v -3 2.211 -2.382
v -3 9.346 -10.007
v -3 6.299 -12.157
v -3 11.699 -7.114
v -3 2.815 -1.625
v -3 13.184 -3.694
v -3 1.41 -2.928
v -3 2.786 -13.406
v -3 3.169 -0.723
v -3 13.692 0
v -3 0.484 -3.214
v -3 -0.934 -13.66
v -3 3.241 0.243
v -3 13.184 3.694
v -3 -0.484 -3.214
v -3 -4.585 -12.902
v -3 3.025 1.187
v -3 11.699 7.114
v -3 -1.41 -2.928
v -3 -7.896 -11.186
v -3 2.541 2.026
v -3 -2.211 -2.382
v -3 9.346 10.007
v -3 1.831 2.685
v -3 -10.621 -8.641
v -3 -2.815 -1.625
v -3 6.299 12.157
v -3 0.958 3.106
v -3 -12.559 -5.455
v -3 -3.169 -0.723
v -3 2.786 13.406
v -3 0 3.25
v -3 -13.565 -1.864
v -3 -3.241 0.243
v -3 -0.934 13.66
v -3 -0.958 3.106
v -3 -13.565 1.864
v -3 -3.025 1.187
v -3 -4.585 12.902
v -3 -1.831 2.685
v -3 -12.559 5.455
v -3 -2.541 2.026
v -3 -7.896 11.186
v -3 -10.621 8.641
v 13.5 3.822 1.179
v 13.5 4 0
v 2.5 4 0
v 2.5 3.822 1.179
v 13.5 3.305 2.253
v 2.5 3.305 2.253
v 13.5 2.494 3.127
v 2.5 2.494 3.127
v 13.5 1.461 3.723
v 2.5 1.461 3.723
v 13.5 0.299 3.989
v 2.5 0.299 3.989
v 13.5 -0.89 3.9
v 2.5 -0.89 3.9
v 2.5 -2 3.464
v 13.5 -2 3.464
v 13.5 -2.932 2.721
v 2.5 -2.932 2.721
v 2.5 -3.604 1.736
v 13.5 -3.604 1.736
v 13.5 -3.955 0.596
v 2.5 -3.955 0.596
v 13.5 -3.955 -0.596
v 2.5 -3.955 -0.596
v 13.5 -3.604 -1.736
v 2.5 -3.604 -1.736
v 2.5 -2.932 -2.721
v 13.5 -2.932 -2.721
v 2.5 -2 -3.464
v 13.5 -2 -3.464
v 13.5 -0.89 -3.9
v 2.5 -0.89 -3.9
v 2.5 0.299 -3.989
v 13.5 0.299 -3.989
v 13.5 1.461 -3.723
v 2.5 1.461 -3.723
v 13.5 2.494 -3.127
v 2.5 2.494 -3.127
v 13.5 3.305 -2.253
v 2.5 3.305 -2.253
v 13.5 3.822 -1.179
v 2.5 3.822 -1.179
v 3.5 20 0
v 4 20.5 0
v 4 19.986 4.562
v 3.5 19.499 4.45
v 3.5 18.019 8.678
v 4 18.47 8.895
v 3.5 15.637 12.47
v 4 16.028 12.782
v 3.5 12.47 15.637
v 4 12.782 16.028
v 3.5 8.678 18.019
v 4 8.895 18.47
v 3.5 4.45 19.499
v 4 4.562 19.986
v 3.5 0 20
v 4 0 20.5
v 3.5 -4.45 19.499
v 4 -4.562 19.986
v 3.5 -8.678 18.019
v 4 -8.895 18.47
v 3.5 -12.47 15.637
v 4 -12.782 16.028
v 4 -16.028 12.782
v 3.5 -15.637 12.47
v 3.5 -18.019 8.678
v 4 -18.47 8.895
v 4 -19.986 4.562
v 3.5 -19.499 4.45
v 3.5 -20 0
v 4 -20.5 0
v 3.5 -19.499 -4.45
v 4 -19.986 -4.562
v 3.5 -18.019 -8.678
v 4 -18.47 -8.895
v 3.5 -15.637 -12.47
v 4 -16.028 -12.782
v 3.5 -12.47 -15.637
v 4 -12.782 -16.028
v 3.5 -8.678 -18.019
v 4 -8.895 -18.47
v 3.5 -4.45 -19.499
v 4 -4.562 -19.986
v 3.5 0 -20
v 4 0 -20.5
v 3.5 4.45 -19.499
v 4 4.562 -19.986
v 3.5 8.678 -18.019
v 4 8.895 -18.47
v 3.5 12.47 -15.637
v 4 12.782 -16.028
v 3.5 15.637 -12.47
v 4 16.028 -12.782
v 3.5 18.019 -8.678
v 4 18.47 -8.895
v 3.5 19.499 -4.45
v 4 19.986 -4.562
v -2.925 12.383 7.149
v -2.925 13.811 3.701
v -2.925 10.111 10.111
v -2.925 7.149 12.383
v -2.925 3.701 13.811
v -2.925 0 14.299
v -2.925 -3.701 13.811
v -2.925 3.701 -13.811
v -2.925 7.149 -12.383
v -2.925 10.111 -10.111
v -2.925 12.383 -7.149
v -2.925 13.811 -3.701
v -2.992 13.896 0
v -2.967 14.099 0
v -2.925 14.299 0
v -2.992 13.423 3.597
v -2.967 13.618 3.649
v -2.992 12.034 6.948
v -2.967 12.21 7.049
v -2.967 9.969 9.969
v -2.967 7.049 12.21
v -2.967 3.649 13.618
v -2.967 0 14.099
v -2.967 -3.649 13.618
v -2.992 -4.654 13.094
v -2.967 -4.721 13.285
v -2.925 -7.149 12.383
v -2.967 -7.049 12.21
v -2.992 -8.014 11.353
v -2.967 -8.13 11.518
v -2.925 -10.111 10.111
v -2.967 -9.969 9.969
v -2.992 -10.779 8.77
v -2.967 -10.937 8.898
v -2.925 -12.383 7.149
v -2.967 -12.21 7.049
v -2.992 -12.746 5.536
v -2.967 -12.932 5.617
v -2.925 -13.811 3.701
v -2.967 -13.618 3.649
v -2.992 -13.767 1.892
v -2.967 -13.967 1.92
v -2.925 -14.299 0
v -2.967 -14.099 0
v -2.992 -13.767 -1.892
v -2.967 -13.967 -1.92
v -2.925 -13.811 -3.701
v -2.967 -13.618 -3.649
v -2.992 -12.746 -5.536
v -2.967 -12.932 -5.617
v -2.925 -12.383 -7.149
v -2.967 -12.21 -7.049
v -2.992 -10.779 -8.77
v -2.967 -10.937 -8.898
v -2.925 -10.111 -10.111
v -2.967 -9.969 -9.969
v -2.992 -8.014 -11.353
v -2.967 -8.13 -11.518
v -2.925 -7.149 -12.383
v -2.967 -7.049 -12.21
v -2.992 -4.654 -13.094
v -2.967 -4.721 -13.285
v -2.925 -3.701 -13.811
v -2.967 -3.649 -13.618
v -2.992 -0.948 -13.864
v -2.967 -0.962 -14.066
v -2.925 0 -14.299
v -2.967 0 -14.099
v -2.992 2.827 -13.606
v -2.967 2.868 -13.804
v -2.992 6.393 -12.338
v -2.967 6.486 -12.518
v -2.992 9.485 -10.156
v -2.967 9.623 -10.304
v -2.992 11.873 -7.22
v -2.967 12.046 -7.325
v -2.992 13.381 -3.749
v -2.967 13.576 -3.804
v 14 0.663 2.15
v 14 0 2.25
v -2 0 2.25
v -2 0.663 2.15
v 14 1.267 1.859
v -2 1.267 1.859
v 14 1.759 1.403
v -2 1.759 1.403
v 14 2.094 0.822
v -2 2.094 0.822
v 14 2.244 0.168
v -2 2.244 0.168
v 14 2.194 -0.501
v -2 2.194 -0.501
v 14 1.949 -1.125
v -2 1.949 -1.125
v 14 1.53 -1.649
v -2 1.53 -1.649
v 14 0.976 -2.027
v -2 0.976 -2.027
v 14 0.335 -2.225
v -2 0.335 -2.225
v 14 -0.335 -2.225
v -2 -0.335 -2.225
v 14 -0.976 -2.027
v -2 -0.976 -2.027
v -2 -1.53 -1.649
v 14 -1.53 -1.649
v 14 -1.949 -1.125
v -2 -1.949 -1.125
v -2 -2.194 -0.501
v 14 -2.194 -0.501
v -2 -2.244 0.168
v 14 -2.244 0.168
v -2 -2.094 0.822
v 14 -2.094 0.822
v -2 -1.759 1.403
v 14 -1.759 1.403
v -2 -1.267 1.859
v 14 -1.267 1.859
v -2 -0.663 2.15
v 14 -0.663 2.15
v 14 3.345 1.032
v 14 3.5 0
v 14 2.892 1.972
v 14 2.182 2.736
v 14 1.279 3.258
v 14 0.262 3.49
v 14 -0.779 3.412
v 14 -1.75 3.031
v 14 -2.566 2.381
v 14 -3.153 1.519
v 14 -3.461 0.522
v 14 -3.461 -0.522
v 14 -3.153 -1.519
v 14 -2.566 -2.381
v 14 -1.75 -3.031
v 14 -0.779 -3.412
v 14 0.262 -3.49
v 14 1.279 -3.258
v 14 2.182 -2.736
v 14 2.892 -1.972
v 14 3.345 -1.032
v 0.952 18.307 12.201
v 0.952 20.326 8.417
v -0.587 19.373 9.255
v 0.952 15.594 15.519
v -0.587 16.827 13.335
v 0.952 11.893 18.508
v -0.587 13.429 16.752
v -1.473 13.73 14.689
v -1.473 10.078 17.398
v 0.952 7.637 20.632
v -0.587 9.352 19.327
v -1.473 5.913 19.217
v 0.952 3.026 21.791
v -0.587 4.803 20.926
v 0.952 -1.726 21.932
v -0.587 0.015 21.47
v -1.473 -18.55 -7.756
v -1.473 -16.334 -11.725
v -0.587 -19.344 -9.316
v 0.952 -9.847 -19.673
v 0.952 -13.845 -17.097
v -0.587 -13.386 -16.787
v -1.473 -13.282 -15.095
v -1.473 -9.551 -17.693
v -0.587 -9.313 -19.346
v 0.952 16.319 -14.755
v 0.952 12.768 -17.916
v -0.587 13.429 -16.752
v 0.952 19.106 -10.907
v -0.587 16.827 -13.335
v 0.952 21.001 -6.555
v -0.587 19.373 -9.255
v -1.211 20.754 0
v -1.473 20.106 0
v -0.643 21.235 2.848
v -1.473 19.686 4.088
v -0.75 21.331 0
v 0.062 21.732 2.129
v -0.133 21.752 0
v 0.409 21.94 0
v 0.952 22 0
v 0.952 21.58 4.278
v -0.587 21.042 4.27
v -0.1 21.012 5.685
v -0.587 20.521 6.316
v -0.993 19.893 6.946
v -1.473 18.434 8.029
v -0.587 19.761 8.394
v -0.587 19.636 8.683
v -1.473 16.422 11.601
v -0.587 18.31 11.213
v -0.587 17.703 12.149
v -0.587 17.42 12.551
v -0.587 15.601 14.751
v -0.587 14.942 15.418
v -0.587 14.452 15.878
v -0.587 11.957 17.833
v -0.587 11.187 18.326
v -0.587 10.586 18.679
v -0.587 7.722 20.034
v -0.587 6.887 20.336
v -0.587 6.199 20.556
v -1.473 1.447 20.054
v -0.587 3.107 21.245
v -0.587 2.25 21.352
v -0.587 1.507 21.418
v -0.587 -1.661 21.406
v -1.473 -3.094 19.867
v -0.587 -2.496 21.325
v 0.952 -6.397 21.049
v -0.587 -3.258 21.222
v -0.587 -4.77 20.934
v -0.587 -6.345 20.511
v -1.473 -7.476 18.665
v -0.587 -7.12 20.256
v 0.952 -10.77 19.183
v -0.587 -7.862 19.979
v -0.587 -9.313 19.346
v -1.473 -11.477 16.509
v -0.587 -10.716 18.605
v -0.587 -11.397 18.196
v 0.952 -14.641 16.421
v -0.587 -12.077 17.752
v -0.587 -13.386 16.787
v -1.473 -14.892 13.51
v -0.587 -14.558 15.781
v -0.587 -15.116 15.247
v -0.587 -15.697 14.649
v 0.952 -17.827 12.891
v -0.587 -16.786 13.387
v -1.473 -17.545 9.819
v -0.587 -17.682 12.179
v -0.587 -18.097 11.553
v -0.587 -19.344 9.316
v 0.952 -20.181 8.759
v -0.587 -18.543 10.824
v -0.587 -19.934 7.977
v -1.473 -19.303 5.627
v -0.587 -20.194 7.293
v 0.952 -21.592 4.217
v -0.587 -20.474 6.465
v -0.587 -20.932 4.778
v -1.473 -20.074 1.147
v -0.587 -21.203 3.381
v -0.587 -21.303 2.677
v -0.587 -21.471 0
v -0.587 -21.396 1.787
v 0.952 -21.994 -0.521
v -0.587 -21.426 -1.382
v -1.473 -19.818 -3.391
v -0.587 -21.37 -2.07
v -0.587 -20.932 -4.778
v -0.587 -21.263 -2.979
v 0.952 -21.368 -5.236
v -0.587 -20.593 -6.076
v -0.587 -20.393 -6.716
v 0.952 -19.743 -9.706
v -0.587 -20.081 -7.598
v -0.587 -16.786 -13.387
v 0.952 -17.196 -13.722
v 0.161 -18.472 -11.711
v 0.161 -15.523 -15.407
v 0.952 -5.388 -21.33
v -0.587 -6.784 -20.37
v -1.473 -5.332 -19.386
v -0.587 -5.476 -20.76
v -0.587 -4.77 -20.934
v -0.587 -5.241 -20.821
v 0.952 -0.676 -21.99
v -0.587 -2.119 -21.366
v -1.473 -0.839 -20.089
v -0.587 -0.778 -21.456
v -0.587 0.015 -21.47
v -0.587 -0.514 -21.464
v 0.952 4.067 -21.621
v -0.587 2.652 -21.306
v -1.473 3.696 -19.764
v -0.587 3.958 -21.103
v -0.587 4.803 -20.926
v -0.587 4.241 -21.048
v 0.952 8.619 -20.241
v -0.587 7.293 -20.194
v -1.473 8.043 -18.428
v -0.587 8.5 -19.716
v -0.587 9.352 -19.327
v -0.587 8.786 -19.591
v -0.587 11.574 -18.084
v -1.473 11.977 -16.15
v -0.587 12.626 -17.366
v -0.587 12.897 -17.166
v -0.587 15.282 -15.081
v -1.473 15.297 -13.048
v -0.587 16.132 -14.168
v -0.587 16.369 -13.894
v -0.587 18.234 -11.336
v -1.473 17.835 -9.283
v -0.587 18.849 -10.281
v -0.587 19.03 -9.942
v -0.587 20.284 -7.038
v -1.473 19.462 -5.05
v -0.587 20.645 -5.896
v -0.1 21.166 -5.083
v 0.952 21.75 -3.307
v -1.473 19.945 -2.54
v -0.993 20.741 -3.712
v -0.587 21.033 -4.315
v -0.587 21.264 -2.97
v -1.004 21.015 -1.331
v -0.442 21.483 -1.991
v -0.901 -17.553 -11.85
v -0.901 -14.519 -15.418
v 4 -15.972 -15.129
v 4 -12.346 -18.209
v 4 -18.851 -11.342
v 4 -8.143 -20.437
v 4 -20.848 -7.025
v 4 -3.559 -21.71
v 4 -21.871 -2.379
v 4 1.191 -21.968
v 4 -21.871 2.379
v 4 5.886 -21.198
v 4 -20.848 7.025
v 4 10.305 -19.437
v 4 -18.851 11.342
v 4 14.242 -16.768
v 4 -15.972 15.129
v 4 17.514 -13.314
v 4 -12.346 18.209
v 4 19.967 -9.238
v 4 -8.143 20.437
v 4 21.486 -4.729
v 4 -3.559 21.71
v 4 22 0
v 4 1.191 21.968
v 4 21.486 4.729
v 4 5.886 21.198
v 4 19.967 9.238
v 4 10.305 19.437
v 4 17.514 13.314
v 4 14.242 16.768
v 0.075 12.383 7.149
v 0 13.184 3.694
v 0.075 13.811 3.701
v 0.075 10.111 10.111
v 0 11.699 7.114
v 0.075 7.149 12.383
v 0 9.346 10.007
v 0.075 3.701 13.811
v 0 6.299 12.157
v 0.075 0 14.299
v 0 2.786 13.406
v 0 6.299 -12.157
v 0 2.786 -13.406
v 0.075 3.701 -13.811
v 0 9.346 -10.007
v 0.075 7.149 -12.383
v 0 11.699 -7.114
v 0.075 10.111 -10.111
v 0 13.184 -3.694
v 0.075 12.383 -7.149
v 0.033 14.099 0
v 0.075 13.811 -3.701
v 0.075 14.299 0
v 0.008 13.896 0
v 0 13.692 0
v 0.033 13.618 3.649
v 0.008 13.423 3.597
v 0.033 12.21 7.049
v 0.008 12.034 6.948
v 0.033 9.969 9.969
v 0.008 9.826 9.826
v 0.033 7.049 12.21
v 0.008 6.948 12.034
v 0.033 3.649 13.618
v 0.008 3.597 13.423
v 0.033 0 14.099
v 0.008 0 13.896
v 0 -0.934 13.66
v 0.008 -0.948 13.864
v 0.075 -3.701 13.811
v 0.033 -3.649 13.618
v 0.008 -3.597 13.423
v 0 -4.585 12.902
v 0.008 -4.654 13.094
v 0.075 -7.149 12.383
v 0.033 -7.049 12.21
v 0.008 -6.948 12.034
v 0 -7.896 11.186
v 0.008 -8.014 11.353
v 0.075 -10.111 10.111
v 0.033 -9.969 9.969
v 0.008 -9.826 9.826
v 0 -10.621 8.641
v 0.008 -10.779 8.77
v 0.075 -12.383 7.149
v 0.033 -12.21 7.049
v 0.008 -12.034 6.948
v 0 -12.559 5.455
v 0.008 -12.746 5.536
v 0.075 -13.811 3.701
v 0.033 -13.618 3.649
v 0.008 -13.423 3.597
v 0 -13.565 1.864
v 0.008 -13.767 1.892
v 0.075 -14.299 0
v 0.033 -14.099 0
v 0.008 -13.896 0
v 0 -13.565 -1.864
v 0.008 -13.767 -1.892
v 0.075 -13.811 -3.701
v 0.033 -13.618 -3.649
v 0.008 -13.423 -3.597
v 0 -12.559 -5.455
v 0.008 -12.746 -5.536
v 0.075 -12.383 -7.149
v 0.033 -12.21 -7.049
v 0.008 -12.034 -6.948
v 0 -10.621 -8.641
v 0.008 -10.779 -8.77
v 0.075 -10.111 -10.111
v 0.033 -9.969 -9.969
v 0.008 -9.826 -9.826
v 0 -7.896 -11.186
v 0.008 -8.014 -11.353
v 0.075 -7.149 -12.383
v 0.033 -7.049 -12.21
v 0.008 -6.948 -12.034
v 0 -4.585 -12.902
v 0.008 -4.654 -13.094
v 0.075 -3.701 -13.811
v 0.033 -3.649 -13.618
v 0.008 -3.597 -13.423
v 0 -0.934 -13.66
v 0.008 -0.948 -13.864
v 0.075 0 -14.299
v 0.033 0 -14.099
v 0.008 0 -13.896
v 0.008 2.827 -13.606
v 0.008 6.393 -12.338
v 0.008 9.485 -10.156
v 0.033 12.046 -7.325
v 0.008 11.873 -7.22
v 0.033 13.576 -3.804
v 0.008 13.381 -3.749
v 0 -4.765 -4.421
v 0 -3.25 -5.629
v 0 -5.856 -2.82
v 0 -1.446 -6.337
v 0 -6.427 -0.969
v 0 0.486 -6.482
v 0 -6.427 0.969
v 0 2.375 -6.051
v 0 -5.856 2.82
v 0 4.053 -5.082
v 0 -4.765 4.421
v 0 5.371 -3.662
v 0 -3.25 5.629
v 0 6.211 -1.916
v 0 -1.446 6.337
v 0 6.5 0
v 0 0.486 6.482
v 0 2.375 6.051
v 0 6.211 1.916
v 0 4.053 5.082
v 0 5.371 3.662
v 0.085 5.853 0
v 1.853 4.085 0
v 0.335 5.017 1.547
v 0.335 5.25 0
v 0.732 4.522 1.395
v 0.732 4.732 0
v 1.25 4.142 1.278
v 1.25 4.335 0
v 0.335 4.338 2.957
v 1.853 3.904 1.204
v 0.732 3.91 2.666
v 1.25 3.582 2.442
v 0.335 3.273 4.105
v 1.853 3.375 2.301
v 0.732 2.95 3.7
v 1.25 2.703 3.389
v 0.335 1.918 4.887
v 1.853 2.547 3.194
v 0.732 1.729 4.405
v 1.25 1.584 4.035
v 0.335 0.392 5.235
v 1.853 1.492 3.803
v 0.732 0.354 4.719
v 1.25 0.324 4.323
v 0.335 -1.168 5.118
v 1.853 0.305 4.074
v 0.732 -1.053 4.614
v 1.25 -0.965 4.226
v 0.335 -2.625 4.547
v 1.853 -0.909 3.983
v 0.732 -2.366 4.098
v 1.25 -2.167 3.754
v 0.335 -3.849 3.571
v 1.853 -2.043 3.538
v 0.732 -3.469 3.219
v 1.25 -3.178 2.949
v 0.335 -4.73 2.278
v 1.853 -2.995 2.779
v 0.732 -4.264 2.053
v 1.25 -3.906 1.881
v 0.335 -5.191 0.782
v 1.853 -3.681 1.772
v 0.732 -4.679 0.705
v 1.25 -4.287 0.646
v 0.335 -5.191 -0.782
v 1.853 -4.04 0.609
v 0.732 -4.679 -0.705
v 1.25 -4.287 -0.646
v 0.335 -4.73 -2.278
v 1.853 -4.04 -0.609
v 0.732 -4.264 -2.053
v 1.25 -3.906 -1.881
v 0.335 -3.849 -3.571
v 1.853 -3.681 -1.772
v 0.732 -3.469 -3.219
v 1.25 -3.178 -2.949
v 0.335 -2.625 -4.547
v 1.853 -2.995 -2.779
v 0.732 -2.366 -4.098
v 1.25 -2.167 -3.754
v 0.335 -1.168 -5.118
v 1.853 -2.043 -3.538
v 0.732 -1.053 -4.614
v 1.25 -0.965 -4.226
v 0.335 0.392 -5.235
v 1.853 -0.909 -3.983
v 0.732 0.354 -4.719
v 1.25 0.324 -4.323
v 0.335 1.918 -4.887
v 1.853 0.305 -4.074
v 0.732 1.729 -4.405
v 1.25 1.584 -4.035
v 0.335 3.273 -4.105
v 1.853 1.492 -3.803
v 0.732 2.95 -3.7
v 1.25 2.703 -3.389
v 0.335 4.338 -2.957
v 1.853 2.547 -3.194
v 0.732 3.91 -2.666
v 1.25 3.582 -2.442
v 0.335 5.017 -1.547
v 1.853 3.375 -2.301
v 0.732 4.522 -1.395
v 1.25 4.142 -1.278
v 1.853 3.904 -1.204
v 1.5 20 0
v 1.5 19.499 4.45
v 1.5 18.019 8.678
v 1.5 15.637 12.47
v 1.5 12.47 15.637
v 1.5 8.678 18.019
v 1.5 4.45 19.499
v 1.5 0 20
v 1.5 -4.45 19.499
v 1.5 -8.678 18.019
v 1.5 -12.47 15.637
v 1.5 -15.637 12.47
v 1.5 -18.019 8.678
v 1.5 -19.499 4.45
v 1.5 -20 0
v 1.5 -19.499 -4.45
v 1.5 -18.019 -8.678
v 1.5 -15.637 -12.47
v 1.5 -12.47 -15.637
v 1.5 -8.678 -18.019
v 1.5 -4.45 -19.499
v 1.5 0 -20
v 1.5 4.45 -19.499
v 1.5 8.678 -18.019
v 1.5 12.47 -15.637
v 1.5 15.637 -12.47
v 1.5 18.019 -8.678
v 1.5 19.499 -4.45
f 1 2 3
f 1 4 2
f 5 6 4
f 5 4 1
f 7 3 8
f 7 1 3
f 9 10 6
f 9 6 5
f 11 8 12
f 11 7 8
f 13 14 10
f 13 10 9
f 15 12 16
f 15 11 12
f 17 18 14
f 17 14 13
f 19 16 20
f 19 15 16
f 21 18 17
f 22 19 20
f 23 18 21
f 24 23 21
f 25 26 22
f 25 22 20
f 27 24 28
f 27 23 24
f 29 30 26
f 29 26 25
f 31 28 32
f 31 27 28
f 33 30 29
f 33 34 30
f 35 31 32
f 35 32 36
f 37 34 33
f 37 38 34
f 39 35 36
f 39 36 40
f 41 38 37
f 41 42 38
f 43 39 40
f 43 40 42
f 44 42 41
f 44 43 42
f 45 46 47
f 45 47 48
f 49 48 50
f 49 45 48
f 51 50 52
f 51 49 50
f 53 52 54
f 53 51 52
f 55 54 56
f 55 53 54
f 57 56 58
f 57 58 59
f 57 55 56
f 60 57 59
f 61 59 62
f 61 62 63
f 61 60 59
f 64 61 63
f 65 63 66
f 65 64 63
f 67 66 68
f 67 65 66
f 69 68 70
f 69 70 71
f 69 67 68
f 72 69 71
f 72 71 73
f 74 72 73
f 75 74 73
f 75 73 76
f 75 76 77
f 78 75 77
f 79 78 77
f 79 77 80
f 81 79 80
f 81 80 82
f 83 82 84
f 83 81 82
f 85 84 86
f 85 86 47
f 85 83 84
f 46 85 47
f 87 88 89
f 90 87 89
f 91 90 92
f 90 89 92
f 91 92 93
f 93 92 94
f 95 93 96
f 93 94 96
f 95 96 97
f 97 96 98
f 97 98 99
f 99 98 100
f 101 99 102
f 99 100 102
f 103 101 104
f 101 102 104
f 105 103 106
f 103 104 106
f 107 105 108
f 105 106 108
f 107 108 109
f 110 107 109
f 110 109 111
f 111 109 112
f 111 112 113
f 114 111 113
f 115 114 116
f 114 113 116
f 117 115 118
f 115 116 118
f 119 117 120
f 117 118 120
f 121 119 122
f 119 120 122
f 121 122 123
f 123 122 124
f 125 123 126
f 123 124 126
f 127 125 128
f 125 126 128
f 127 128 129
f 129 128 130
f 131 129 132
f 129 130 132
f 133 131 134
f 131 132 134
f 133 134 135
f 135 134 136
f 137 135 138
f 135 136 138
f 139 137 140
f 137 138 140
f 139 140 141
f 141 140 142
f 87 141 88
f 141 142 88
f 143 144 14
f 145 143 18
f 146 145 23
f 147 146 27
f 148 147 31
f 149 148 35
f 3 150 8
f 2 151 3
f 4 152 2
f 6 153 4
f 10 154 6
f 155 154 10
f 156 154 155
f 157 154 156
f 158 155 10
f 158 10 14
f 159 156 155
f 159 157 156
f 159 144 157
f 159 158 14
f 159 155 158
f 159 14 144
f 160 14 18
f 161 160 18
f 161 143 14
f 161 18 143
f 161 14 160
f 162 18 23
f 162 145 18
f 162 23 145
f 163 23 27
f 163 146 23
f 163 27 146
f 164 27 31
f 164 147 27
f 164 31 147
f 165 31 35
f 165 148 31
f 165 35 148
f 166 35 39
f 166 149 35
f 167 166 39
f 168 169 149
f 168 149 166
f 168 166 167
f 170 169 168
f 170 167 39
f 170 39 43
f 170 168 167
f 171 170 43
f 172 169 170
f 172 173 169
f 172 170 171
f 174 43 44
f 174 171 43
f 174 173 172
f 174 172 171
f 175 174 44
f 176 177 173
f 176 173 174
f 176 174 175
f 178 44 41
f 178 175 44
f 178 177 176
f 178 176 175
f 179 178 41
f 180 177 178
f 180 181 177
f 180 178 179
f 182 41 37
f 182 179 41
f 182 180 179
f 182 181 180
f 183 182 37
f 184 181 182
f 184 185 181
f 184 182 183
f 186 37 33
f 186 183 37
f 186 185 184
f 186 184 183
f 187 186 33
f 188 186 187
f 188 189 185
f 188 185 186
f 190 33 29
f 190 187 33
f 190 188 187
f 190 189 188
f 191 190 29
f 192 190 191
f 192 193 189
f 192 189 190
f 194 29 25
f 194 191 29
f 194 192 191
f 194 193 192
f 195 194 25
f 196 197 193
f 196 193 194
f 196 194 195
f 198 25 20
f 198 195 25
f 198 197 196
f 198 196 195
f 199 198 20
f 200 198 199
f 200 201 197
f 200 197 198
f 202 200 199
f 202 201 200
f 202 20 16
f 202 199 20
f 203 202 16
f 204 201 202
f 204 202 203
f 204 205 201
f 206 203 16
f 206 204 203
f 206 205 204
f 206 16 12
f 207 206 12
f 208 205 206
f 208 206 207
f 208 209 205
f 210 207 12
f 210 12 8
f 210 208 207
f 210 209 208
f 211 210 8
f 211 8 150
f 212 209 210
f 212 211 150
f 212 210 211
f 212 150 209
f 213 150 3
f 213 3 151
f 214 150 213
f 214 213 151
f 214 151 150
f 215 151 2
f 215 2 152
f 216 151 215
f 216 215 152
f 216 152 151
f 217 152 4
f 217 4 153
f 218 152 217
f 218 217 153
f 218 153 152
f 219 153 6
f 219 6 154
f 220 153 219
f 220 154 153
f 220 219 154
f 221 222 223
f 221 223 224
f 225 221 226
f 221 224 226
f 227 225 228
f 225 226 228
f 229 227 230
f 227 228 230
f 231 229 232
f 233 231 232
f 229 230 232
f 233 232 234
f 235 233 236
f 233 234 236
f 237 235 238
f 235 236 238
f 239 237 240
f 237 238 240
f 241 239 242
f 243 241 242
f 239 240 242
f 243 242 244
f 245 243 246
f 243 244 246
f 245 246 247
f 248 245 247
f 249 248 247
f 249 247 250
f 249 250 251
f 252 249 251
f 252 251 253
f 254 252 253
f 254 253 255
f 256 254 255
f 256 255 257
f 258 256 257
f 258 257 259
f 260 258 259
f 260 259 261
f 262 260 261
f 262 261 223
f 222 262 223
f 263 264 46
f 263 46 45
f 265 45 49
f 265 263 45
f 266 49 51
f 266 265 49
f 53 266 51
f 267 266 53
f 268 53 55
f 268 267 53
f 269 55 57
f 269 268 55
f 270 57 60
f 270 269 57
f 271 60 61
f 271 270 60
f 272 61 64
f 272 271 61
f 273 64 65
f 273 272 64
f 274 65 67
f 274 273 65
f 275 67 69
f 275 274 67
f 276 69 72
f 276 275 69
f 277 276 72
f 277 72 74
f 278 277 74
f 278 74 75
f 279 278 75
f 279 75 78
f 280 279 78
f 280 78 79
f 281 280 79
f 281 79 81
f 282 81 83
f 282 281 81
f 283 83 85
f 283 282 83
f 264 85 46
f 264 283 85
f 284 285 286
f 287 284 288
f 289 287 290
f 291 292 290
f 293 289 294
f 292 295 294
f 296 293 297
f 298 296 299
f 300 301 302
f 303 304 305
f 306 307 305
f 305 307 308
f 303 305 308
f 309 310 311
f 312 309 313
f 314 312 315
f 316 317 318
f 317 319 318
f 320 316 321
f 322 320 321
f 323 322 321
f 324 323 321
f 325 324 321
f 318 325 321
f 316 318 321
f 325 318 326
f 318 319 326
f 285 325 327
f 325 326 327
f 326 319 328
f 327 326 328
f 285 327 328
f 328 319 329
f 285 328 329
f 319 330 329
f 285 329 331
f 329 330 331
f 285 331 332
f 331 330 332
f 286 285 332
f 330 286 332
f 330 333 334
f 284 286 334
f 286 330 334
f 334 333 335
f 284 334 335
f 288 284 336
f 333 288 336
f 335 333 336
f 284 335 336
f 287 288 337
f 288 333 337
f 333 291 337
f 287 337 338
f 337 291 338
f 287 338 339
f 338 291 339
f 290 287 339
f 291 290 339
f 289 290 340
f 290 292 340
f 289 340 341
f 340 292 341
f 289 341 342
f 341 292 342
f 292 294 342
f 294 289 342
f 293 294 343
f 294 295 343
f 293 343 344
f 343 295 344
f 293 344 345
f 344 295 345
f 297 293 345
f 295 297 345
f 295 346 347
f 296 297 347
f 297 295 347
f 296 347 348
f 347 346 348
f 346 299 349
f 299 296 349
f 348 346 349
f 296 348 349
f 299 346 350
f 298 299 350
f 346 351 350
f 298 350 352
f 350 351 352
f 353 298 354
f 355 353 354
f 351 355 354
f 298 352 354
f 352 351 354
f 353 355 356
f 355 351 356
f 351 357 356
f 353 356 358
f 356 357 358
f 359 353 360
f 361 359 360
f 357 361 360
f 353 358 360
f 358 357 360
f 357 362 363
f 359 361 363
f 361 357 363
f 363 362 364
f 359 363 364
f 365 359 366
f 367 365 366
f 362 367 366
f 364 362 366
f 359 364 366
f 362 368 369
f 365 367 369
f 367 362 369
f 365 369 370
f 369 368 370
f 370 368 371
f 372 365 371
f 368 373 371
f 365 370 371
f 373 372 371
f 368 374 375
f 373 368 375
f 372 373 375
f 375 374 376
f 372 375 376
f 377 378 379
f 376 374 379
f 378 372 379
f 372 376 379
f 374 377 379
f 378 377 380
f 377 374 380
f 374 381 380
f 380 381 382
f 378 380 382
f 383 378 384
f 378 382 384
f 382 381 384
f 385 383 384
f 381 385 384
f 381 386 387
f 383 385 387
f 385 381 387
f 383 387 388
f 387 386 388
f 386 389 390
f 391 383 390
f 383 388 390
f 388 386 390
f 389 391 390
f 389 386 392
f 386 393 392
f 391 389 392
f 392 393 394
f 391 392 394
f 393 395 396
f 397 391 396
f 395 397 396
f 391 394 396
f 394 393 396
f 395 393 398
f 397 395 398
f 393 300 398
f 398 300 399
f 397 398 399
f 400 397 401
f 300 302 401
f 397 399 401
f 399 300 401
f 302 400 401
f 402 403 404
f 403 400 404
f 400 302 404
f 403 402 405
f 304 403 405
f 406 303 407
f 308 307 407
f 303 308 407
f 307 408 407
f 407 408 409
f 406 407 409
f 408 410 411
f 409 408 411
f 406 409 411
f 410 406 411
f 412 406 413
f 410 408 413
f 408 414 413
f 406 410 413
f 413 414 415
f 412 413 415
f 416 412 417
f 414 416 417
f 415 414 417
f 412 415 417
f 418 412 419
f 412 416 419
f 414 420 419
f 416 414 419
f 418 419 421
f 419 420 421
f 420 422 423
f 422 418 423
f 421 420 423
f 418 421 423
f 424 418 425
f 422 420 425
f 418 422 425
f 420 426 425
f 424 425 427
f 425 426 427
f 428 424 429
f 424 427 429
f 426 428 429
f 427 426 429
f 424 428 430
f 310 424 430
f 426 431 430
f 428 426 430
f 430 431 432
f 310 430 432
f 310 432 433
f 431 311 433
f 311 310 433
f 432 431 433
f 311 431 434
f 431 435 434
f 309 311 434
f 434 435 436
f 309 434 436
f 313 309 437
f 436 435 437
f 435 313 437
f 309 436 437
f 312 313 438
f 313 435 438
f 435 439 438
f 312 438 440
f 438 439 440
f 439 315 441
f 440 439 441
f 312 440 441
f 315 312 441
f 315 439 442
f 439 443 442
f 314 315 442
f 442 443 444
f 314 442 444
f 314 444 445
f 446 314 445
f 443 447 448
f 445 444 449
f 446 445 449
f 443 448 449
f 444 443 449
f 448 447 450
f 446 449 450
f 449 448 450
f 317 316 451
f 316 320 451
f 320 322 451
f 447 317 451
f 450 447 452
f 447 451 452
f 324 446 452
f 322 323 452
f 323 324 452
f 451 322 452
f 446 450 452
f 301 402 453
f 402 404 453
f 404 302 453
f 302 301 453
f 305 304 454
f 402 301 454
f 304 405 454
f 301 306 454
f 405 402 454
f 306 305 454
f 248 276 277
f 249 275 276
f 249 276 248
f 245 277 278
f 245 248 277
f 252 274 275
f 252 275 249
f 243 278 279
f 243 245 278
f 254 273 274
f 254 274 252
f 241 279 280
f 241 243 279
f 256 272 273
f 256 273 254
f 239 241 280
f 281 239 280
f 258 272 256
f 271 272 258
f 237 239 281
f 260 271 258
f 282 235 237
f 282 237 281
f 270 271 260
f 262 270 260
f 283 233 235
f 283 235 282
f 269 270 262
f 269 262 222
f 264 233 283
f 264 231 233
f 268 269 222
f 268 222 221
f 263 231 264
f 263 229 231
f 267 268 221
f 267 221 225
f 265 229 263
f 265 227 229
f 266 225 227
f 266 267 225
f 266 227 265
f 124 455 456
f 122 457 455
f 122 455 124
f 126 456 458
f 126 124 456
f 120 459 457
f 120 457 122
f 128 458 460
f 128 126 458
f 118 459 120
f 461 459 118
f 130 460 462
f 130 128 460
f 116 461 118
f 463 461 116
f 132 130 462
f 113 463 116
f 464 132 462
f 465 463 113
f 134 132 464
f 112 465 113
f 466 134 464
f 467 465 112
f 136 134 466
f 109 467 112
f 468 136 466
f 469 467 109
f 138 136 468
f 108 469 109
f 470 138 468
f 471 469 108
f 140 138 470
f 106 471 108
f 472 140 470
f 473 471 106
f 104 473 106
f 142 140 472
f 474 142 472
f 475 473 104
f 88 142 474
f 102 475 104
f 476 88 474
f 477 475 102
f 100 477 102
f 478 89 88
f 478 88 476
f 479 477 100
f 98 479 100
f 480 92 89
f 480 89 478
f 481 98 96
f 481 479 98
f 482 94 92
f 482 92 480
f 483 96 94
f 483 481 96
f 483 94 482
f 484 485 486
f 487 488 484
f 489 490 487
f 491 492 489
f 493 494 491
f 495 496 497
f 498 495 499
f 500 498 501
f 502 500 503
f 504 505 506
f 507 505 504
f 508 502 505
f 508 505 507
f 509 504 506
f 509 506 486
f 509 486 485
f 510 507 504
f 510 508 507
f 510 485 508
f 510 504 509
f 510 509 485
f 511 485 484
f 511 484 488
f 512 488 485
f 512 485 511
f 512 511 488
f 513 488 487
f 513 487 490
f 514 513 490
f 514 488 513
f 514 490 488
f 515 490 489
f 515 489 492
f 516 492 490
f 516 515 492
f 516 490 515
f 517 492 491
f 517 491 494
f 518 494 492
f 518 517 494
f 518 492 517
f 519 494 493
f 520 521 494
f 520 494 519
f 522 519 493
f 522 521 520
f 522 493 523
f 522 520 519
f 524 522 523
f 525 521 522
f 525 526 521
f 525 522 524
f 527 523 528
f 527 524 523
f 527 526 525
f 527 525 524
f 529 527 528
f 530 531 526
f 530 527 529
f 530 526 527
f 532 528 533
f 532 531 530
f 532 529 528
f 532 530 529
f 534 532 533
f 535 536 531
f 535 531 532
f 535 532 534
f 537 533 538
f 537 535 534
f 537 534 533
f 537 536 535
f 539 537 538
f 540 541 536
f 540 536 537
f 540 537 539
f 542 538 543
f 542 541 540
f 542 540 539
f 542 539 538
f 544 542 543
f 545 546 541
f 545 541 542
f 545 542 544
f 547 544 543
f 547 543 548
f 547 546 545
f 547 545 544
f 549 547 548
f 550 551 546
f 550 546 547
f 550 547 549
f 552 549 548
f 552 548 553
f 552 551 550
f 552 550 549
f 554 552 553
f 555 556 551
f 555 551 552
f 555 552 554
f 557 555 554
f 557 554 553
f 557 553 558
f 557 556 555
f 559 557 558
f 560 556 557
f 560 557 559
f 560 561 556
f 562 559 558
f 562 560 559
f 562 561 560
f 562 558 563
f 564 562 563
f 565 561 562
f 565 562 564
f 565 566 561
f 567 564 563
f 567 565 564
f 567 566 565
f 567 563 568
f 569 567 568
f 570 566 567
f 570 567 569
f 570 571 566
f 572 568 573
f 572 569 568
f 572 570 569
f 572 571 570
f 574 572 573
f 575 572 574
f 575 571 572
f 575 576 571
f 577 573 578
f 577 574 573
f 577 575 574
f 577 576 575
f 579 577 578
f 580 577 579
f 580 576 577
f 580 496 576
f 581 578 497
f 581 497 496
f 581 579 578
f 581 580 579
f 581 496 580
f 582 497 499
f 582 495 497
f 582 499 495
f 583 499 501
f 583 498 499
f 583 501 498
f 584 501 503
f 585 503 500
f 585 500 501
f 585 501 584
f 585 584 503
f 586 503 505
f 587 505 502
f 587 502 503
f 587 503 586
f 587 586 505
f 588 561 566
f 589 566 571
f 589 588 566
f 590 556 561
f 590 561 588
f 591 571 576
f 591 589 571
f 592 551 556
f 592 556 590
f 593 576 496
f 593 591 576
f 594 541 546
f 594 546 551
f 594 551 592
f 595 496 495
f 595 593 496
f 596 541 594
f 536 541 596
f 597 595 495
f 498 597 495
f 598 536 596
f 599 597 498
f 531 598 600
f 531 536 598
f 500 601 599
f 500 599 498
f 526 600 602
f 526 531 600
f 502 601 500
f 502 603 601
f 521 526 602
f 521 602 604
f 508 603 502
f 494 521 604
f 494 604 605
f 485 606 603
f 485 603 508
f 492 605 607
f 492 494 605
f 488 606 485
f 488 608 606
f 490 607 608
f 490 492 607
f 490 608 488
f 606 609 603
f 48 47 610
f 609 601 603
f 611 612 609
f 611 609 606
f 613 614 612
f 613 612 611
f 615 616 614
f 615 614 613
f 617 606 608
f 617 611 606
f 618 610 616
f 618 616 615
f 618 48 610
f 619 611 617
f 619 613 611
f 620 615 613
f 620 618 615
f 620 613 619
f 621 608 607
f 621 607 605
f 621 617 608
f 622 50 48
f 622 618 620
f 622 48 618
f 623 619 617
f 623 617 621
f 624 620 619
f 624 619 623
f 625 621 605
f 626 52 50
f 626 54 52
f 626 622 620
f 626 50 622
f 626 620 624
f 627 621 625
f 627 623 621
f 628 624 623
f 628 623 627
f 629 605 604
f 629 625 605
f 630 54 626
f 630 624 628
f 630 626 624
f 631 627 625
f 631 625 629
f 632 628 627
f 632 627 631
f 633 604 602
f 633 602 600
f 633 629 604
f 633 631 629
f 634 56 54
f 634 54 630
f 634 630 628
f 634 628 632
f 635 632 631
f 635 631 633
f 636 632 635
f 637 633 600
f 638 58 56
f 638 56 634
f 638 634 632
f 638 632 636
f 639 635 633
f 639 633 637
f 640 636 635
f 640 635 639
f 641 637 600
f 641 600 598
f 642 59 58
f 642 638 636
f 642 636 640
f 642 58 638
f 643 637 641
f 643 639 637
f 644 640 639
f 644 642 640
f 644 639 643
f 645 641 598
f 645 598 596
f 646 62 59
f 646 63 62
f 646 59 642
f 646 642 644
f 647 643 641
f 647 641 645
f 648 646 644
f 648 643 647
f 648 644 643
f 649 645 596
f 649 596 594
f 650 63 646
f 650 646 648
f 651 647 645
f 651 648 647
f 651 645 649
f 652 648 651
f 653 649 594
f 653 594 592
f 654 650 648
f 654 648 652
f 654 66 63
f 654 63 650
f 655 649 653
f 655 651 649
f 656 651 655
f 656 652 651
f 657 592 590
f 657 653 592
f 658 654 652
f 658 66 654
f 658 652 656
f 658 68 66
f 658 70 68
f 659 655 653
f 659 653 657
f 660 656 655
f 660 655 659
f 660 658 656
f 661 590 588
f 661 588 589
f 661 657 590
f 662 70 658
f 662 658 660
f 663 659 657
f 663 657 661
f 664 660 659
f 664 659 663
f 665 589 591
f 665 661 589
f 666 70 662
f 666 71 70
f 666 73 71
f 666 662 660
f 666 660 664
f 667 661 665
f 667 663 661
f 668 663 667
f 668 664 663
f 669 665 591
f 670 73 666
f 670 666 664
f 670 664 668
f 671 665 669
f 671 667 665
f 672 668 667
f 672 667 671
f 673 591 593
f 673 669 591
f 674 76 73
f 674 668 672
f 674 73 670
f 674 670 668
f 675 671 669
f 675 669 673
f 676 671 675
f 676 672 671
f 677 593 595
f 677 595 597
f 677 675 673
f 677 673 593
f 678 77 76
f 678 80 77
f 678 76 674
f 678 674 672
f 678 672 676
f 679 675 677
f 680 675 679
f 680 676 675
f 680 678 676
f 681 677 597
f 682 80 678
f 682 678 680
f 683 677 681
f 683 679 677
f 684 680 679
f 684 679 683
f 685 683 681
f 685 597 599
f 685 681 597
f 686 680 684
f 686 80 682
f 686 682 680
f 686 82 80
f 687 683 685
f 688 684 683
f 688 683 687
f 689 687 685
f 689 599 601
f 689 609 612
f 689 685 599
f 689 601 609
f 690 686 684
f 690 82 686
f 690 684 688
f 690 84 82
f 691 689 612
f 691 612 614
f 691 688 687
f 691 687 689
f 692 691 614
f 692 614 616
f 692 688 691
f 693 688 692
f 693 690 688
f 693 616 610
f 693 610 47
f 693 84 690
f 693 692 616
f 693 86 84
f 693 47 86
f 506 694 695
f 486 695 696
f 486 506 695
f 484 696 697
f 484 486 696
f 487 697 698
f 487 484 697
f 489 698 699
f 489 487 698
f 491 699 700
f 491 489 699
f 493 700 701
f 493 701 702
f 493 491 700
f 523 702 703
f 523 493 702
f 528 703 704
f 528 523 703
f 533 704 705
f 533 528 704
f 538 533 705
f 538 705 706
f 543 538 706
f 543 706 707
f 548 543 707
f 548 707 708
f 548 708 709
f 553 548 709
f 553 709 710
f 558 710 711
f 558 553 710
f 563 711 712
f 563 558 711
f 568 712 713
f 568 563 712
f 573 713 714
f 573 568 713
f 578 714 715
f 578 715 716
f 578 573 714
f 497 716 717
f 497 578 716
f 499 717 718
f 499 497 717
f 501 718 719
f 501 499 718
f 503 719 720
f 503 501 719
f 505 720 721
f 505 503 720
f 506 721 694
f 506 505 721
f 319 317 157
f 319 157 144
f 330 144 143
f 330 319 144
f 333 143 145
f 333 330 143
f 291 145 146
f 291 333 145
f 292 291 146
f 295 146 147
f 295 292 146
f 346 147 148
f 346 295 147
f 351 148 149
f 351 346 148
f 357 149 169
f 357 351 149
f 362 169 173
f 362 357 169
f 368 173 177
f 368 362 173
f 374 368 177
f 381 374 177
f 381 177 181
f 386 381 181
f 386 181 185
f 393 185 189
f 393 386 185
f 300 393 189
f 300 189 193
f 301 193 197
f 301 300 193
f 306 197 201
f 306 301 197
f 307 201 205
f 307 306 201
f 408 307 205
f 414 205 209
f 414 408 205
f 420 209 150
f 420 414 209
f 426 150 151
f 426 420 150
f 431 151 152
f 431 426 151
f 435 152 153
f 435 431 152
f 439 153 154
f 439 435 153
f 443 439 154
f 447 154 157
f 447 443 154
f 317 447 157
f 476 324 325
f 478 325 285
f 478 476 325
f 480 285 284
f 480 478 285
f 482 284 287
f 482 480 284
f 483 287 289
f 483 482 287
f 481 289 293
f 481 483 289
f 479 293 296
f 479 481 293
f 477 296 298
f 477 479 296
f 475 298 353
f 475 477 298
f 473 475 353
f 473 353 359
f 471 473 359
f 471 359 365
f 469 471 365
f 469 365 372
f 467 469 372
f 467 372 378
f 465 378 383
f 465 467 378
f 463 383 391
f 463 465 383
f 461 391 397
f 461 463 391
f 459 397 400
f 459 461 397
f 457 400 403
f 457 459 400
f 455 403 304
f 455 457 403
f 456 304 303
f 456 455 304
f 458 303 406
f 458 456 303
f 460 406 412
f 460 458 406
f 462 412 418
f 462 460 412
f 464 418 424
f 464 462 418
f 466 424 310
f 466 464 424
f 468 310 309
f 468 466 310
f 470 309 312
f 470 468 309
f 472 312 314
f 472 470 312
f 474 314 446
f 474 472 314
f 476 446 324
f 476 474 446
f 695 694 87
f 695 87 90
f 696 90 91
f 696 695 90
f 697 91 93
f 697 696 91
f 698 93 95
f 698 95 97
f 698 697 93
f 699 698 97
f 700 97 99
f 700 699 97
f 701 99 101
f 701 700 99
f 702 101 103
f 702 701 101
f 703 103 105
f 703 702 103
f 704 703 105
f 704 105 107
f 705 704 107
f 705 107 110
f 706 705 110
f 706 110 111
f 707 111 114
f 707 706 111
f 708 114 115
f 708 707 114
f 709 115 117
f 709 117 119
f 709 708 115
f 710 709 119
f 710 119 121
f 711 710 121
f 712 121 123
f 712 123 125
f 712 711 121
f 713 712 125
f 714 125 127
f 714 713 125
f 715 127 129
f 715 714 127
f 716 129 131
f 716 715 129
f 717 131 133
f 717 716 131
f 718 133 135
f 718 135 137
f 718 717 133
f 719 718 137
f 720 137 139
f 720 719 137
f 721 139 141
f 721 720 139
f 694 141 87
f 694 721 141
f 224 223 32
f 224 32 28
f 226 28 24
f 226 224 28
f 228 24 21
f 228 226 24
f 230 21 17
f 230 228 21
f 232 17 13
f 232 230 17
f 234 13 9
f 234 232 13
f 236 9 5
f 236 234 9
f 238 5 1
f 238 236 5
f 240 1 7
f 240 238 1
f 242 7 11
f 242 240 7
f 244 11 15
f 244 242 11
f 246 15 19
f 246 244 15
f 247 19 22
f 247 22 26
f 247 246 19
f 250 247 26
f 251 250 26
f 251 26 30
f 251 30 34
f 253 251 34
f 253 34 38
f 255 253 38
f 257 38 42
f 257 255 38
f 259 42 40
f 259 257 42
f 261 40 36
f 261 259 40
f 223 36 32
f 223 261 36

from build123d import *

# Parameters (mm, degrees)
FILLET1_R          = 2.5
CHAMFER1_SIZE      = 0.5
SKETCH3_R          = 2.25
CUT_EXTRUDE1_DEPTH = 18
CHAMFER2_SIZE      = 1


with BuildPart() as part:
    # Sketch1 → Revolve1 (revolve)
    with BuildSketch(Plane.XY):
        Polygon((4, 22), (4, 20), (1.5, 20), (0, 14), (0, 4), (14, 4), (14, 0), (-3, 0), (-3, 14), (-1, 22), align=None)
    revolve(axis=Axis((0, 0, 0), (1, 0, 0)))

    # Fillet1
    fillet1_edges = [part.edges().sort_by_distance(p)[0] for p in [
        (-1, -22, 0),
        (-3, -14, 0),
        (0, -4, 0),
        (0, -14, 0),
    ]]
    fillet(fillet1_edges, radius=FILLET1_R)

    # Chamfer1
    chamfer1_edges = [part.edges().sort_by_distance(p)[0] for p in [
        (4, -20, 0),
        (14, -4, 0),
    ]]
    chamfer(chamfer1_edges, length=CHAMFER1_SIZE)

    # Sketch3 → Cut-Extrude1 (cut, through all)
    with BuildSketch(Plane.ZY.offset(3)):
        Circle(SKETCH3_R)
    extrude(amount=-CUT_EXTRUDE1_DEPTH, mode=Mode.SUBTRACT)

    # Chamfer2
    chamfer2_edges = [part.edges().sort_by_distance(p)[0] for p in [
        (-3, 0, -2.25),
    ]]
    chamfer(chamfer2_edges, length=CHAMFER2_SIZE)


solid = part.part
